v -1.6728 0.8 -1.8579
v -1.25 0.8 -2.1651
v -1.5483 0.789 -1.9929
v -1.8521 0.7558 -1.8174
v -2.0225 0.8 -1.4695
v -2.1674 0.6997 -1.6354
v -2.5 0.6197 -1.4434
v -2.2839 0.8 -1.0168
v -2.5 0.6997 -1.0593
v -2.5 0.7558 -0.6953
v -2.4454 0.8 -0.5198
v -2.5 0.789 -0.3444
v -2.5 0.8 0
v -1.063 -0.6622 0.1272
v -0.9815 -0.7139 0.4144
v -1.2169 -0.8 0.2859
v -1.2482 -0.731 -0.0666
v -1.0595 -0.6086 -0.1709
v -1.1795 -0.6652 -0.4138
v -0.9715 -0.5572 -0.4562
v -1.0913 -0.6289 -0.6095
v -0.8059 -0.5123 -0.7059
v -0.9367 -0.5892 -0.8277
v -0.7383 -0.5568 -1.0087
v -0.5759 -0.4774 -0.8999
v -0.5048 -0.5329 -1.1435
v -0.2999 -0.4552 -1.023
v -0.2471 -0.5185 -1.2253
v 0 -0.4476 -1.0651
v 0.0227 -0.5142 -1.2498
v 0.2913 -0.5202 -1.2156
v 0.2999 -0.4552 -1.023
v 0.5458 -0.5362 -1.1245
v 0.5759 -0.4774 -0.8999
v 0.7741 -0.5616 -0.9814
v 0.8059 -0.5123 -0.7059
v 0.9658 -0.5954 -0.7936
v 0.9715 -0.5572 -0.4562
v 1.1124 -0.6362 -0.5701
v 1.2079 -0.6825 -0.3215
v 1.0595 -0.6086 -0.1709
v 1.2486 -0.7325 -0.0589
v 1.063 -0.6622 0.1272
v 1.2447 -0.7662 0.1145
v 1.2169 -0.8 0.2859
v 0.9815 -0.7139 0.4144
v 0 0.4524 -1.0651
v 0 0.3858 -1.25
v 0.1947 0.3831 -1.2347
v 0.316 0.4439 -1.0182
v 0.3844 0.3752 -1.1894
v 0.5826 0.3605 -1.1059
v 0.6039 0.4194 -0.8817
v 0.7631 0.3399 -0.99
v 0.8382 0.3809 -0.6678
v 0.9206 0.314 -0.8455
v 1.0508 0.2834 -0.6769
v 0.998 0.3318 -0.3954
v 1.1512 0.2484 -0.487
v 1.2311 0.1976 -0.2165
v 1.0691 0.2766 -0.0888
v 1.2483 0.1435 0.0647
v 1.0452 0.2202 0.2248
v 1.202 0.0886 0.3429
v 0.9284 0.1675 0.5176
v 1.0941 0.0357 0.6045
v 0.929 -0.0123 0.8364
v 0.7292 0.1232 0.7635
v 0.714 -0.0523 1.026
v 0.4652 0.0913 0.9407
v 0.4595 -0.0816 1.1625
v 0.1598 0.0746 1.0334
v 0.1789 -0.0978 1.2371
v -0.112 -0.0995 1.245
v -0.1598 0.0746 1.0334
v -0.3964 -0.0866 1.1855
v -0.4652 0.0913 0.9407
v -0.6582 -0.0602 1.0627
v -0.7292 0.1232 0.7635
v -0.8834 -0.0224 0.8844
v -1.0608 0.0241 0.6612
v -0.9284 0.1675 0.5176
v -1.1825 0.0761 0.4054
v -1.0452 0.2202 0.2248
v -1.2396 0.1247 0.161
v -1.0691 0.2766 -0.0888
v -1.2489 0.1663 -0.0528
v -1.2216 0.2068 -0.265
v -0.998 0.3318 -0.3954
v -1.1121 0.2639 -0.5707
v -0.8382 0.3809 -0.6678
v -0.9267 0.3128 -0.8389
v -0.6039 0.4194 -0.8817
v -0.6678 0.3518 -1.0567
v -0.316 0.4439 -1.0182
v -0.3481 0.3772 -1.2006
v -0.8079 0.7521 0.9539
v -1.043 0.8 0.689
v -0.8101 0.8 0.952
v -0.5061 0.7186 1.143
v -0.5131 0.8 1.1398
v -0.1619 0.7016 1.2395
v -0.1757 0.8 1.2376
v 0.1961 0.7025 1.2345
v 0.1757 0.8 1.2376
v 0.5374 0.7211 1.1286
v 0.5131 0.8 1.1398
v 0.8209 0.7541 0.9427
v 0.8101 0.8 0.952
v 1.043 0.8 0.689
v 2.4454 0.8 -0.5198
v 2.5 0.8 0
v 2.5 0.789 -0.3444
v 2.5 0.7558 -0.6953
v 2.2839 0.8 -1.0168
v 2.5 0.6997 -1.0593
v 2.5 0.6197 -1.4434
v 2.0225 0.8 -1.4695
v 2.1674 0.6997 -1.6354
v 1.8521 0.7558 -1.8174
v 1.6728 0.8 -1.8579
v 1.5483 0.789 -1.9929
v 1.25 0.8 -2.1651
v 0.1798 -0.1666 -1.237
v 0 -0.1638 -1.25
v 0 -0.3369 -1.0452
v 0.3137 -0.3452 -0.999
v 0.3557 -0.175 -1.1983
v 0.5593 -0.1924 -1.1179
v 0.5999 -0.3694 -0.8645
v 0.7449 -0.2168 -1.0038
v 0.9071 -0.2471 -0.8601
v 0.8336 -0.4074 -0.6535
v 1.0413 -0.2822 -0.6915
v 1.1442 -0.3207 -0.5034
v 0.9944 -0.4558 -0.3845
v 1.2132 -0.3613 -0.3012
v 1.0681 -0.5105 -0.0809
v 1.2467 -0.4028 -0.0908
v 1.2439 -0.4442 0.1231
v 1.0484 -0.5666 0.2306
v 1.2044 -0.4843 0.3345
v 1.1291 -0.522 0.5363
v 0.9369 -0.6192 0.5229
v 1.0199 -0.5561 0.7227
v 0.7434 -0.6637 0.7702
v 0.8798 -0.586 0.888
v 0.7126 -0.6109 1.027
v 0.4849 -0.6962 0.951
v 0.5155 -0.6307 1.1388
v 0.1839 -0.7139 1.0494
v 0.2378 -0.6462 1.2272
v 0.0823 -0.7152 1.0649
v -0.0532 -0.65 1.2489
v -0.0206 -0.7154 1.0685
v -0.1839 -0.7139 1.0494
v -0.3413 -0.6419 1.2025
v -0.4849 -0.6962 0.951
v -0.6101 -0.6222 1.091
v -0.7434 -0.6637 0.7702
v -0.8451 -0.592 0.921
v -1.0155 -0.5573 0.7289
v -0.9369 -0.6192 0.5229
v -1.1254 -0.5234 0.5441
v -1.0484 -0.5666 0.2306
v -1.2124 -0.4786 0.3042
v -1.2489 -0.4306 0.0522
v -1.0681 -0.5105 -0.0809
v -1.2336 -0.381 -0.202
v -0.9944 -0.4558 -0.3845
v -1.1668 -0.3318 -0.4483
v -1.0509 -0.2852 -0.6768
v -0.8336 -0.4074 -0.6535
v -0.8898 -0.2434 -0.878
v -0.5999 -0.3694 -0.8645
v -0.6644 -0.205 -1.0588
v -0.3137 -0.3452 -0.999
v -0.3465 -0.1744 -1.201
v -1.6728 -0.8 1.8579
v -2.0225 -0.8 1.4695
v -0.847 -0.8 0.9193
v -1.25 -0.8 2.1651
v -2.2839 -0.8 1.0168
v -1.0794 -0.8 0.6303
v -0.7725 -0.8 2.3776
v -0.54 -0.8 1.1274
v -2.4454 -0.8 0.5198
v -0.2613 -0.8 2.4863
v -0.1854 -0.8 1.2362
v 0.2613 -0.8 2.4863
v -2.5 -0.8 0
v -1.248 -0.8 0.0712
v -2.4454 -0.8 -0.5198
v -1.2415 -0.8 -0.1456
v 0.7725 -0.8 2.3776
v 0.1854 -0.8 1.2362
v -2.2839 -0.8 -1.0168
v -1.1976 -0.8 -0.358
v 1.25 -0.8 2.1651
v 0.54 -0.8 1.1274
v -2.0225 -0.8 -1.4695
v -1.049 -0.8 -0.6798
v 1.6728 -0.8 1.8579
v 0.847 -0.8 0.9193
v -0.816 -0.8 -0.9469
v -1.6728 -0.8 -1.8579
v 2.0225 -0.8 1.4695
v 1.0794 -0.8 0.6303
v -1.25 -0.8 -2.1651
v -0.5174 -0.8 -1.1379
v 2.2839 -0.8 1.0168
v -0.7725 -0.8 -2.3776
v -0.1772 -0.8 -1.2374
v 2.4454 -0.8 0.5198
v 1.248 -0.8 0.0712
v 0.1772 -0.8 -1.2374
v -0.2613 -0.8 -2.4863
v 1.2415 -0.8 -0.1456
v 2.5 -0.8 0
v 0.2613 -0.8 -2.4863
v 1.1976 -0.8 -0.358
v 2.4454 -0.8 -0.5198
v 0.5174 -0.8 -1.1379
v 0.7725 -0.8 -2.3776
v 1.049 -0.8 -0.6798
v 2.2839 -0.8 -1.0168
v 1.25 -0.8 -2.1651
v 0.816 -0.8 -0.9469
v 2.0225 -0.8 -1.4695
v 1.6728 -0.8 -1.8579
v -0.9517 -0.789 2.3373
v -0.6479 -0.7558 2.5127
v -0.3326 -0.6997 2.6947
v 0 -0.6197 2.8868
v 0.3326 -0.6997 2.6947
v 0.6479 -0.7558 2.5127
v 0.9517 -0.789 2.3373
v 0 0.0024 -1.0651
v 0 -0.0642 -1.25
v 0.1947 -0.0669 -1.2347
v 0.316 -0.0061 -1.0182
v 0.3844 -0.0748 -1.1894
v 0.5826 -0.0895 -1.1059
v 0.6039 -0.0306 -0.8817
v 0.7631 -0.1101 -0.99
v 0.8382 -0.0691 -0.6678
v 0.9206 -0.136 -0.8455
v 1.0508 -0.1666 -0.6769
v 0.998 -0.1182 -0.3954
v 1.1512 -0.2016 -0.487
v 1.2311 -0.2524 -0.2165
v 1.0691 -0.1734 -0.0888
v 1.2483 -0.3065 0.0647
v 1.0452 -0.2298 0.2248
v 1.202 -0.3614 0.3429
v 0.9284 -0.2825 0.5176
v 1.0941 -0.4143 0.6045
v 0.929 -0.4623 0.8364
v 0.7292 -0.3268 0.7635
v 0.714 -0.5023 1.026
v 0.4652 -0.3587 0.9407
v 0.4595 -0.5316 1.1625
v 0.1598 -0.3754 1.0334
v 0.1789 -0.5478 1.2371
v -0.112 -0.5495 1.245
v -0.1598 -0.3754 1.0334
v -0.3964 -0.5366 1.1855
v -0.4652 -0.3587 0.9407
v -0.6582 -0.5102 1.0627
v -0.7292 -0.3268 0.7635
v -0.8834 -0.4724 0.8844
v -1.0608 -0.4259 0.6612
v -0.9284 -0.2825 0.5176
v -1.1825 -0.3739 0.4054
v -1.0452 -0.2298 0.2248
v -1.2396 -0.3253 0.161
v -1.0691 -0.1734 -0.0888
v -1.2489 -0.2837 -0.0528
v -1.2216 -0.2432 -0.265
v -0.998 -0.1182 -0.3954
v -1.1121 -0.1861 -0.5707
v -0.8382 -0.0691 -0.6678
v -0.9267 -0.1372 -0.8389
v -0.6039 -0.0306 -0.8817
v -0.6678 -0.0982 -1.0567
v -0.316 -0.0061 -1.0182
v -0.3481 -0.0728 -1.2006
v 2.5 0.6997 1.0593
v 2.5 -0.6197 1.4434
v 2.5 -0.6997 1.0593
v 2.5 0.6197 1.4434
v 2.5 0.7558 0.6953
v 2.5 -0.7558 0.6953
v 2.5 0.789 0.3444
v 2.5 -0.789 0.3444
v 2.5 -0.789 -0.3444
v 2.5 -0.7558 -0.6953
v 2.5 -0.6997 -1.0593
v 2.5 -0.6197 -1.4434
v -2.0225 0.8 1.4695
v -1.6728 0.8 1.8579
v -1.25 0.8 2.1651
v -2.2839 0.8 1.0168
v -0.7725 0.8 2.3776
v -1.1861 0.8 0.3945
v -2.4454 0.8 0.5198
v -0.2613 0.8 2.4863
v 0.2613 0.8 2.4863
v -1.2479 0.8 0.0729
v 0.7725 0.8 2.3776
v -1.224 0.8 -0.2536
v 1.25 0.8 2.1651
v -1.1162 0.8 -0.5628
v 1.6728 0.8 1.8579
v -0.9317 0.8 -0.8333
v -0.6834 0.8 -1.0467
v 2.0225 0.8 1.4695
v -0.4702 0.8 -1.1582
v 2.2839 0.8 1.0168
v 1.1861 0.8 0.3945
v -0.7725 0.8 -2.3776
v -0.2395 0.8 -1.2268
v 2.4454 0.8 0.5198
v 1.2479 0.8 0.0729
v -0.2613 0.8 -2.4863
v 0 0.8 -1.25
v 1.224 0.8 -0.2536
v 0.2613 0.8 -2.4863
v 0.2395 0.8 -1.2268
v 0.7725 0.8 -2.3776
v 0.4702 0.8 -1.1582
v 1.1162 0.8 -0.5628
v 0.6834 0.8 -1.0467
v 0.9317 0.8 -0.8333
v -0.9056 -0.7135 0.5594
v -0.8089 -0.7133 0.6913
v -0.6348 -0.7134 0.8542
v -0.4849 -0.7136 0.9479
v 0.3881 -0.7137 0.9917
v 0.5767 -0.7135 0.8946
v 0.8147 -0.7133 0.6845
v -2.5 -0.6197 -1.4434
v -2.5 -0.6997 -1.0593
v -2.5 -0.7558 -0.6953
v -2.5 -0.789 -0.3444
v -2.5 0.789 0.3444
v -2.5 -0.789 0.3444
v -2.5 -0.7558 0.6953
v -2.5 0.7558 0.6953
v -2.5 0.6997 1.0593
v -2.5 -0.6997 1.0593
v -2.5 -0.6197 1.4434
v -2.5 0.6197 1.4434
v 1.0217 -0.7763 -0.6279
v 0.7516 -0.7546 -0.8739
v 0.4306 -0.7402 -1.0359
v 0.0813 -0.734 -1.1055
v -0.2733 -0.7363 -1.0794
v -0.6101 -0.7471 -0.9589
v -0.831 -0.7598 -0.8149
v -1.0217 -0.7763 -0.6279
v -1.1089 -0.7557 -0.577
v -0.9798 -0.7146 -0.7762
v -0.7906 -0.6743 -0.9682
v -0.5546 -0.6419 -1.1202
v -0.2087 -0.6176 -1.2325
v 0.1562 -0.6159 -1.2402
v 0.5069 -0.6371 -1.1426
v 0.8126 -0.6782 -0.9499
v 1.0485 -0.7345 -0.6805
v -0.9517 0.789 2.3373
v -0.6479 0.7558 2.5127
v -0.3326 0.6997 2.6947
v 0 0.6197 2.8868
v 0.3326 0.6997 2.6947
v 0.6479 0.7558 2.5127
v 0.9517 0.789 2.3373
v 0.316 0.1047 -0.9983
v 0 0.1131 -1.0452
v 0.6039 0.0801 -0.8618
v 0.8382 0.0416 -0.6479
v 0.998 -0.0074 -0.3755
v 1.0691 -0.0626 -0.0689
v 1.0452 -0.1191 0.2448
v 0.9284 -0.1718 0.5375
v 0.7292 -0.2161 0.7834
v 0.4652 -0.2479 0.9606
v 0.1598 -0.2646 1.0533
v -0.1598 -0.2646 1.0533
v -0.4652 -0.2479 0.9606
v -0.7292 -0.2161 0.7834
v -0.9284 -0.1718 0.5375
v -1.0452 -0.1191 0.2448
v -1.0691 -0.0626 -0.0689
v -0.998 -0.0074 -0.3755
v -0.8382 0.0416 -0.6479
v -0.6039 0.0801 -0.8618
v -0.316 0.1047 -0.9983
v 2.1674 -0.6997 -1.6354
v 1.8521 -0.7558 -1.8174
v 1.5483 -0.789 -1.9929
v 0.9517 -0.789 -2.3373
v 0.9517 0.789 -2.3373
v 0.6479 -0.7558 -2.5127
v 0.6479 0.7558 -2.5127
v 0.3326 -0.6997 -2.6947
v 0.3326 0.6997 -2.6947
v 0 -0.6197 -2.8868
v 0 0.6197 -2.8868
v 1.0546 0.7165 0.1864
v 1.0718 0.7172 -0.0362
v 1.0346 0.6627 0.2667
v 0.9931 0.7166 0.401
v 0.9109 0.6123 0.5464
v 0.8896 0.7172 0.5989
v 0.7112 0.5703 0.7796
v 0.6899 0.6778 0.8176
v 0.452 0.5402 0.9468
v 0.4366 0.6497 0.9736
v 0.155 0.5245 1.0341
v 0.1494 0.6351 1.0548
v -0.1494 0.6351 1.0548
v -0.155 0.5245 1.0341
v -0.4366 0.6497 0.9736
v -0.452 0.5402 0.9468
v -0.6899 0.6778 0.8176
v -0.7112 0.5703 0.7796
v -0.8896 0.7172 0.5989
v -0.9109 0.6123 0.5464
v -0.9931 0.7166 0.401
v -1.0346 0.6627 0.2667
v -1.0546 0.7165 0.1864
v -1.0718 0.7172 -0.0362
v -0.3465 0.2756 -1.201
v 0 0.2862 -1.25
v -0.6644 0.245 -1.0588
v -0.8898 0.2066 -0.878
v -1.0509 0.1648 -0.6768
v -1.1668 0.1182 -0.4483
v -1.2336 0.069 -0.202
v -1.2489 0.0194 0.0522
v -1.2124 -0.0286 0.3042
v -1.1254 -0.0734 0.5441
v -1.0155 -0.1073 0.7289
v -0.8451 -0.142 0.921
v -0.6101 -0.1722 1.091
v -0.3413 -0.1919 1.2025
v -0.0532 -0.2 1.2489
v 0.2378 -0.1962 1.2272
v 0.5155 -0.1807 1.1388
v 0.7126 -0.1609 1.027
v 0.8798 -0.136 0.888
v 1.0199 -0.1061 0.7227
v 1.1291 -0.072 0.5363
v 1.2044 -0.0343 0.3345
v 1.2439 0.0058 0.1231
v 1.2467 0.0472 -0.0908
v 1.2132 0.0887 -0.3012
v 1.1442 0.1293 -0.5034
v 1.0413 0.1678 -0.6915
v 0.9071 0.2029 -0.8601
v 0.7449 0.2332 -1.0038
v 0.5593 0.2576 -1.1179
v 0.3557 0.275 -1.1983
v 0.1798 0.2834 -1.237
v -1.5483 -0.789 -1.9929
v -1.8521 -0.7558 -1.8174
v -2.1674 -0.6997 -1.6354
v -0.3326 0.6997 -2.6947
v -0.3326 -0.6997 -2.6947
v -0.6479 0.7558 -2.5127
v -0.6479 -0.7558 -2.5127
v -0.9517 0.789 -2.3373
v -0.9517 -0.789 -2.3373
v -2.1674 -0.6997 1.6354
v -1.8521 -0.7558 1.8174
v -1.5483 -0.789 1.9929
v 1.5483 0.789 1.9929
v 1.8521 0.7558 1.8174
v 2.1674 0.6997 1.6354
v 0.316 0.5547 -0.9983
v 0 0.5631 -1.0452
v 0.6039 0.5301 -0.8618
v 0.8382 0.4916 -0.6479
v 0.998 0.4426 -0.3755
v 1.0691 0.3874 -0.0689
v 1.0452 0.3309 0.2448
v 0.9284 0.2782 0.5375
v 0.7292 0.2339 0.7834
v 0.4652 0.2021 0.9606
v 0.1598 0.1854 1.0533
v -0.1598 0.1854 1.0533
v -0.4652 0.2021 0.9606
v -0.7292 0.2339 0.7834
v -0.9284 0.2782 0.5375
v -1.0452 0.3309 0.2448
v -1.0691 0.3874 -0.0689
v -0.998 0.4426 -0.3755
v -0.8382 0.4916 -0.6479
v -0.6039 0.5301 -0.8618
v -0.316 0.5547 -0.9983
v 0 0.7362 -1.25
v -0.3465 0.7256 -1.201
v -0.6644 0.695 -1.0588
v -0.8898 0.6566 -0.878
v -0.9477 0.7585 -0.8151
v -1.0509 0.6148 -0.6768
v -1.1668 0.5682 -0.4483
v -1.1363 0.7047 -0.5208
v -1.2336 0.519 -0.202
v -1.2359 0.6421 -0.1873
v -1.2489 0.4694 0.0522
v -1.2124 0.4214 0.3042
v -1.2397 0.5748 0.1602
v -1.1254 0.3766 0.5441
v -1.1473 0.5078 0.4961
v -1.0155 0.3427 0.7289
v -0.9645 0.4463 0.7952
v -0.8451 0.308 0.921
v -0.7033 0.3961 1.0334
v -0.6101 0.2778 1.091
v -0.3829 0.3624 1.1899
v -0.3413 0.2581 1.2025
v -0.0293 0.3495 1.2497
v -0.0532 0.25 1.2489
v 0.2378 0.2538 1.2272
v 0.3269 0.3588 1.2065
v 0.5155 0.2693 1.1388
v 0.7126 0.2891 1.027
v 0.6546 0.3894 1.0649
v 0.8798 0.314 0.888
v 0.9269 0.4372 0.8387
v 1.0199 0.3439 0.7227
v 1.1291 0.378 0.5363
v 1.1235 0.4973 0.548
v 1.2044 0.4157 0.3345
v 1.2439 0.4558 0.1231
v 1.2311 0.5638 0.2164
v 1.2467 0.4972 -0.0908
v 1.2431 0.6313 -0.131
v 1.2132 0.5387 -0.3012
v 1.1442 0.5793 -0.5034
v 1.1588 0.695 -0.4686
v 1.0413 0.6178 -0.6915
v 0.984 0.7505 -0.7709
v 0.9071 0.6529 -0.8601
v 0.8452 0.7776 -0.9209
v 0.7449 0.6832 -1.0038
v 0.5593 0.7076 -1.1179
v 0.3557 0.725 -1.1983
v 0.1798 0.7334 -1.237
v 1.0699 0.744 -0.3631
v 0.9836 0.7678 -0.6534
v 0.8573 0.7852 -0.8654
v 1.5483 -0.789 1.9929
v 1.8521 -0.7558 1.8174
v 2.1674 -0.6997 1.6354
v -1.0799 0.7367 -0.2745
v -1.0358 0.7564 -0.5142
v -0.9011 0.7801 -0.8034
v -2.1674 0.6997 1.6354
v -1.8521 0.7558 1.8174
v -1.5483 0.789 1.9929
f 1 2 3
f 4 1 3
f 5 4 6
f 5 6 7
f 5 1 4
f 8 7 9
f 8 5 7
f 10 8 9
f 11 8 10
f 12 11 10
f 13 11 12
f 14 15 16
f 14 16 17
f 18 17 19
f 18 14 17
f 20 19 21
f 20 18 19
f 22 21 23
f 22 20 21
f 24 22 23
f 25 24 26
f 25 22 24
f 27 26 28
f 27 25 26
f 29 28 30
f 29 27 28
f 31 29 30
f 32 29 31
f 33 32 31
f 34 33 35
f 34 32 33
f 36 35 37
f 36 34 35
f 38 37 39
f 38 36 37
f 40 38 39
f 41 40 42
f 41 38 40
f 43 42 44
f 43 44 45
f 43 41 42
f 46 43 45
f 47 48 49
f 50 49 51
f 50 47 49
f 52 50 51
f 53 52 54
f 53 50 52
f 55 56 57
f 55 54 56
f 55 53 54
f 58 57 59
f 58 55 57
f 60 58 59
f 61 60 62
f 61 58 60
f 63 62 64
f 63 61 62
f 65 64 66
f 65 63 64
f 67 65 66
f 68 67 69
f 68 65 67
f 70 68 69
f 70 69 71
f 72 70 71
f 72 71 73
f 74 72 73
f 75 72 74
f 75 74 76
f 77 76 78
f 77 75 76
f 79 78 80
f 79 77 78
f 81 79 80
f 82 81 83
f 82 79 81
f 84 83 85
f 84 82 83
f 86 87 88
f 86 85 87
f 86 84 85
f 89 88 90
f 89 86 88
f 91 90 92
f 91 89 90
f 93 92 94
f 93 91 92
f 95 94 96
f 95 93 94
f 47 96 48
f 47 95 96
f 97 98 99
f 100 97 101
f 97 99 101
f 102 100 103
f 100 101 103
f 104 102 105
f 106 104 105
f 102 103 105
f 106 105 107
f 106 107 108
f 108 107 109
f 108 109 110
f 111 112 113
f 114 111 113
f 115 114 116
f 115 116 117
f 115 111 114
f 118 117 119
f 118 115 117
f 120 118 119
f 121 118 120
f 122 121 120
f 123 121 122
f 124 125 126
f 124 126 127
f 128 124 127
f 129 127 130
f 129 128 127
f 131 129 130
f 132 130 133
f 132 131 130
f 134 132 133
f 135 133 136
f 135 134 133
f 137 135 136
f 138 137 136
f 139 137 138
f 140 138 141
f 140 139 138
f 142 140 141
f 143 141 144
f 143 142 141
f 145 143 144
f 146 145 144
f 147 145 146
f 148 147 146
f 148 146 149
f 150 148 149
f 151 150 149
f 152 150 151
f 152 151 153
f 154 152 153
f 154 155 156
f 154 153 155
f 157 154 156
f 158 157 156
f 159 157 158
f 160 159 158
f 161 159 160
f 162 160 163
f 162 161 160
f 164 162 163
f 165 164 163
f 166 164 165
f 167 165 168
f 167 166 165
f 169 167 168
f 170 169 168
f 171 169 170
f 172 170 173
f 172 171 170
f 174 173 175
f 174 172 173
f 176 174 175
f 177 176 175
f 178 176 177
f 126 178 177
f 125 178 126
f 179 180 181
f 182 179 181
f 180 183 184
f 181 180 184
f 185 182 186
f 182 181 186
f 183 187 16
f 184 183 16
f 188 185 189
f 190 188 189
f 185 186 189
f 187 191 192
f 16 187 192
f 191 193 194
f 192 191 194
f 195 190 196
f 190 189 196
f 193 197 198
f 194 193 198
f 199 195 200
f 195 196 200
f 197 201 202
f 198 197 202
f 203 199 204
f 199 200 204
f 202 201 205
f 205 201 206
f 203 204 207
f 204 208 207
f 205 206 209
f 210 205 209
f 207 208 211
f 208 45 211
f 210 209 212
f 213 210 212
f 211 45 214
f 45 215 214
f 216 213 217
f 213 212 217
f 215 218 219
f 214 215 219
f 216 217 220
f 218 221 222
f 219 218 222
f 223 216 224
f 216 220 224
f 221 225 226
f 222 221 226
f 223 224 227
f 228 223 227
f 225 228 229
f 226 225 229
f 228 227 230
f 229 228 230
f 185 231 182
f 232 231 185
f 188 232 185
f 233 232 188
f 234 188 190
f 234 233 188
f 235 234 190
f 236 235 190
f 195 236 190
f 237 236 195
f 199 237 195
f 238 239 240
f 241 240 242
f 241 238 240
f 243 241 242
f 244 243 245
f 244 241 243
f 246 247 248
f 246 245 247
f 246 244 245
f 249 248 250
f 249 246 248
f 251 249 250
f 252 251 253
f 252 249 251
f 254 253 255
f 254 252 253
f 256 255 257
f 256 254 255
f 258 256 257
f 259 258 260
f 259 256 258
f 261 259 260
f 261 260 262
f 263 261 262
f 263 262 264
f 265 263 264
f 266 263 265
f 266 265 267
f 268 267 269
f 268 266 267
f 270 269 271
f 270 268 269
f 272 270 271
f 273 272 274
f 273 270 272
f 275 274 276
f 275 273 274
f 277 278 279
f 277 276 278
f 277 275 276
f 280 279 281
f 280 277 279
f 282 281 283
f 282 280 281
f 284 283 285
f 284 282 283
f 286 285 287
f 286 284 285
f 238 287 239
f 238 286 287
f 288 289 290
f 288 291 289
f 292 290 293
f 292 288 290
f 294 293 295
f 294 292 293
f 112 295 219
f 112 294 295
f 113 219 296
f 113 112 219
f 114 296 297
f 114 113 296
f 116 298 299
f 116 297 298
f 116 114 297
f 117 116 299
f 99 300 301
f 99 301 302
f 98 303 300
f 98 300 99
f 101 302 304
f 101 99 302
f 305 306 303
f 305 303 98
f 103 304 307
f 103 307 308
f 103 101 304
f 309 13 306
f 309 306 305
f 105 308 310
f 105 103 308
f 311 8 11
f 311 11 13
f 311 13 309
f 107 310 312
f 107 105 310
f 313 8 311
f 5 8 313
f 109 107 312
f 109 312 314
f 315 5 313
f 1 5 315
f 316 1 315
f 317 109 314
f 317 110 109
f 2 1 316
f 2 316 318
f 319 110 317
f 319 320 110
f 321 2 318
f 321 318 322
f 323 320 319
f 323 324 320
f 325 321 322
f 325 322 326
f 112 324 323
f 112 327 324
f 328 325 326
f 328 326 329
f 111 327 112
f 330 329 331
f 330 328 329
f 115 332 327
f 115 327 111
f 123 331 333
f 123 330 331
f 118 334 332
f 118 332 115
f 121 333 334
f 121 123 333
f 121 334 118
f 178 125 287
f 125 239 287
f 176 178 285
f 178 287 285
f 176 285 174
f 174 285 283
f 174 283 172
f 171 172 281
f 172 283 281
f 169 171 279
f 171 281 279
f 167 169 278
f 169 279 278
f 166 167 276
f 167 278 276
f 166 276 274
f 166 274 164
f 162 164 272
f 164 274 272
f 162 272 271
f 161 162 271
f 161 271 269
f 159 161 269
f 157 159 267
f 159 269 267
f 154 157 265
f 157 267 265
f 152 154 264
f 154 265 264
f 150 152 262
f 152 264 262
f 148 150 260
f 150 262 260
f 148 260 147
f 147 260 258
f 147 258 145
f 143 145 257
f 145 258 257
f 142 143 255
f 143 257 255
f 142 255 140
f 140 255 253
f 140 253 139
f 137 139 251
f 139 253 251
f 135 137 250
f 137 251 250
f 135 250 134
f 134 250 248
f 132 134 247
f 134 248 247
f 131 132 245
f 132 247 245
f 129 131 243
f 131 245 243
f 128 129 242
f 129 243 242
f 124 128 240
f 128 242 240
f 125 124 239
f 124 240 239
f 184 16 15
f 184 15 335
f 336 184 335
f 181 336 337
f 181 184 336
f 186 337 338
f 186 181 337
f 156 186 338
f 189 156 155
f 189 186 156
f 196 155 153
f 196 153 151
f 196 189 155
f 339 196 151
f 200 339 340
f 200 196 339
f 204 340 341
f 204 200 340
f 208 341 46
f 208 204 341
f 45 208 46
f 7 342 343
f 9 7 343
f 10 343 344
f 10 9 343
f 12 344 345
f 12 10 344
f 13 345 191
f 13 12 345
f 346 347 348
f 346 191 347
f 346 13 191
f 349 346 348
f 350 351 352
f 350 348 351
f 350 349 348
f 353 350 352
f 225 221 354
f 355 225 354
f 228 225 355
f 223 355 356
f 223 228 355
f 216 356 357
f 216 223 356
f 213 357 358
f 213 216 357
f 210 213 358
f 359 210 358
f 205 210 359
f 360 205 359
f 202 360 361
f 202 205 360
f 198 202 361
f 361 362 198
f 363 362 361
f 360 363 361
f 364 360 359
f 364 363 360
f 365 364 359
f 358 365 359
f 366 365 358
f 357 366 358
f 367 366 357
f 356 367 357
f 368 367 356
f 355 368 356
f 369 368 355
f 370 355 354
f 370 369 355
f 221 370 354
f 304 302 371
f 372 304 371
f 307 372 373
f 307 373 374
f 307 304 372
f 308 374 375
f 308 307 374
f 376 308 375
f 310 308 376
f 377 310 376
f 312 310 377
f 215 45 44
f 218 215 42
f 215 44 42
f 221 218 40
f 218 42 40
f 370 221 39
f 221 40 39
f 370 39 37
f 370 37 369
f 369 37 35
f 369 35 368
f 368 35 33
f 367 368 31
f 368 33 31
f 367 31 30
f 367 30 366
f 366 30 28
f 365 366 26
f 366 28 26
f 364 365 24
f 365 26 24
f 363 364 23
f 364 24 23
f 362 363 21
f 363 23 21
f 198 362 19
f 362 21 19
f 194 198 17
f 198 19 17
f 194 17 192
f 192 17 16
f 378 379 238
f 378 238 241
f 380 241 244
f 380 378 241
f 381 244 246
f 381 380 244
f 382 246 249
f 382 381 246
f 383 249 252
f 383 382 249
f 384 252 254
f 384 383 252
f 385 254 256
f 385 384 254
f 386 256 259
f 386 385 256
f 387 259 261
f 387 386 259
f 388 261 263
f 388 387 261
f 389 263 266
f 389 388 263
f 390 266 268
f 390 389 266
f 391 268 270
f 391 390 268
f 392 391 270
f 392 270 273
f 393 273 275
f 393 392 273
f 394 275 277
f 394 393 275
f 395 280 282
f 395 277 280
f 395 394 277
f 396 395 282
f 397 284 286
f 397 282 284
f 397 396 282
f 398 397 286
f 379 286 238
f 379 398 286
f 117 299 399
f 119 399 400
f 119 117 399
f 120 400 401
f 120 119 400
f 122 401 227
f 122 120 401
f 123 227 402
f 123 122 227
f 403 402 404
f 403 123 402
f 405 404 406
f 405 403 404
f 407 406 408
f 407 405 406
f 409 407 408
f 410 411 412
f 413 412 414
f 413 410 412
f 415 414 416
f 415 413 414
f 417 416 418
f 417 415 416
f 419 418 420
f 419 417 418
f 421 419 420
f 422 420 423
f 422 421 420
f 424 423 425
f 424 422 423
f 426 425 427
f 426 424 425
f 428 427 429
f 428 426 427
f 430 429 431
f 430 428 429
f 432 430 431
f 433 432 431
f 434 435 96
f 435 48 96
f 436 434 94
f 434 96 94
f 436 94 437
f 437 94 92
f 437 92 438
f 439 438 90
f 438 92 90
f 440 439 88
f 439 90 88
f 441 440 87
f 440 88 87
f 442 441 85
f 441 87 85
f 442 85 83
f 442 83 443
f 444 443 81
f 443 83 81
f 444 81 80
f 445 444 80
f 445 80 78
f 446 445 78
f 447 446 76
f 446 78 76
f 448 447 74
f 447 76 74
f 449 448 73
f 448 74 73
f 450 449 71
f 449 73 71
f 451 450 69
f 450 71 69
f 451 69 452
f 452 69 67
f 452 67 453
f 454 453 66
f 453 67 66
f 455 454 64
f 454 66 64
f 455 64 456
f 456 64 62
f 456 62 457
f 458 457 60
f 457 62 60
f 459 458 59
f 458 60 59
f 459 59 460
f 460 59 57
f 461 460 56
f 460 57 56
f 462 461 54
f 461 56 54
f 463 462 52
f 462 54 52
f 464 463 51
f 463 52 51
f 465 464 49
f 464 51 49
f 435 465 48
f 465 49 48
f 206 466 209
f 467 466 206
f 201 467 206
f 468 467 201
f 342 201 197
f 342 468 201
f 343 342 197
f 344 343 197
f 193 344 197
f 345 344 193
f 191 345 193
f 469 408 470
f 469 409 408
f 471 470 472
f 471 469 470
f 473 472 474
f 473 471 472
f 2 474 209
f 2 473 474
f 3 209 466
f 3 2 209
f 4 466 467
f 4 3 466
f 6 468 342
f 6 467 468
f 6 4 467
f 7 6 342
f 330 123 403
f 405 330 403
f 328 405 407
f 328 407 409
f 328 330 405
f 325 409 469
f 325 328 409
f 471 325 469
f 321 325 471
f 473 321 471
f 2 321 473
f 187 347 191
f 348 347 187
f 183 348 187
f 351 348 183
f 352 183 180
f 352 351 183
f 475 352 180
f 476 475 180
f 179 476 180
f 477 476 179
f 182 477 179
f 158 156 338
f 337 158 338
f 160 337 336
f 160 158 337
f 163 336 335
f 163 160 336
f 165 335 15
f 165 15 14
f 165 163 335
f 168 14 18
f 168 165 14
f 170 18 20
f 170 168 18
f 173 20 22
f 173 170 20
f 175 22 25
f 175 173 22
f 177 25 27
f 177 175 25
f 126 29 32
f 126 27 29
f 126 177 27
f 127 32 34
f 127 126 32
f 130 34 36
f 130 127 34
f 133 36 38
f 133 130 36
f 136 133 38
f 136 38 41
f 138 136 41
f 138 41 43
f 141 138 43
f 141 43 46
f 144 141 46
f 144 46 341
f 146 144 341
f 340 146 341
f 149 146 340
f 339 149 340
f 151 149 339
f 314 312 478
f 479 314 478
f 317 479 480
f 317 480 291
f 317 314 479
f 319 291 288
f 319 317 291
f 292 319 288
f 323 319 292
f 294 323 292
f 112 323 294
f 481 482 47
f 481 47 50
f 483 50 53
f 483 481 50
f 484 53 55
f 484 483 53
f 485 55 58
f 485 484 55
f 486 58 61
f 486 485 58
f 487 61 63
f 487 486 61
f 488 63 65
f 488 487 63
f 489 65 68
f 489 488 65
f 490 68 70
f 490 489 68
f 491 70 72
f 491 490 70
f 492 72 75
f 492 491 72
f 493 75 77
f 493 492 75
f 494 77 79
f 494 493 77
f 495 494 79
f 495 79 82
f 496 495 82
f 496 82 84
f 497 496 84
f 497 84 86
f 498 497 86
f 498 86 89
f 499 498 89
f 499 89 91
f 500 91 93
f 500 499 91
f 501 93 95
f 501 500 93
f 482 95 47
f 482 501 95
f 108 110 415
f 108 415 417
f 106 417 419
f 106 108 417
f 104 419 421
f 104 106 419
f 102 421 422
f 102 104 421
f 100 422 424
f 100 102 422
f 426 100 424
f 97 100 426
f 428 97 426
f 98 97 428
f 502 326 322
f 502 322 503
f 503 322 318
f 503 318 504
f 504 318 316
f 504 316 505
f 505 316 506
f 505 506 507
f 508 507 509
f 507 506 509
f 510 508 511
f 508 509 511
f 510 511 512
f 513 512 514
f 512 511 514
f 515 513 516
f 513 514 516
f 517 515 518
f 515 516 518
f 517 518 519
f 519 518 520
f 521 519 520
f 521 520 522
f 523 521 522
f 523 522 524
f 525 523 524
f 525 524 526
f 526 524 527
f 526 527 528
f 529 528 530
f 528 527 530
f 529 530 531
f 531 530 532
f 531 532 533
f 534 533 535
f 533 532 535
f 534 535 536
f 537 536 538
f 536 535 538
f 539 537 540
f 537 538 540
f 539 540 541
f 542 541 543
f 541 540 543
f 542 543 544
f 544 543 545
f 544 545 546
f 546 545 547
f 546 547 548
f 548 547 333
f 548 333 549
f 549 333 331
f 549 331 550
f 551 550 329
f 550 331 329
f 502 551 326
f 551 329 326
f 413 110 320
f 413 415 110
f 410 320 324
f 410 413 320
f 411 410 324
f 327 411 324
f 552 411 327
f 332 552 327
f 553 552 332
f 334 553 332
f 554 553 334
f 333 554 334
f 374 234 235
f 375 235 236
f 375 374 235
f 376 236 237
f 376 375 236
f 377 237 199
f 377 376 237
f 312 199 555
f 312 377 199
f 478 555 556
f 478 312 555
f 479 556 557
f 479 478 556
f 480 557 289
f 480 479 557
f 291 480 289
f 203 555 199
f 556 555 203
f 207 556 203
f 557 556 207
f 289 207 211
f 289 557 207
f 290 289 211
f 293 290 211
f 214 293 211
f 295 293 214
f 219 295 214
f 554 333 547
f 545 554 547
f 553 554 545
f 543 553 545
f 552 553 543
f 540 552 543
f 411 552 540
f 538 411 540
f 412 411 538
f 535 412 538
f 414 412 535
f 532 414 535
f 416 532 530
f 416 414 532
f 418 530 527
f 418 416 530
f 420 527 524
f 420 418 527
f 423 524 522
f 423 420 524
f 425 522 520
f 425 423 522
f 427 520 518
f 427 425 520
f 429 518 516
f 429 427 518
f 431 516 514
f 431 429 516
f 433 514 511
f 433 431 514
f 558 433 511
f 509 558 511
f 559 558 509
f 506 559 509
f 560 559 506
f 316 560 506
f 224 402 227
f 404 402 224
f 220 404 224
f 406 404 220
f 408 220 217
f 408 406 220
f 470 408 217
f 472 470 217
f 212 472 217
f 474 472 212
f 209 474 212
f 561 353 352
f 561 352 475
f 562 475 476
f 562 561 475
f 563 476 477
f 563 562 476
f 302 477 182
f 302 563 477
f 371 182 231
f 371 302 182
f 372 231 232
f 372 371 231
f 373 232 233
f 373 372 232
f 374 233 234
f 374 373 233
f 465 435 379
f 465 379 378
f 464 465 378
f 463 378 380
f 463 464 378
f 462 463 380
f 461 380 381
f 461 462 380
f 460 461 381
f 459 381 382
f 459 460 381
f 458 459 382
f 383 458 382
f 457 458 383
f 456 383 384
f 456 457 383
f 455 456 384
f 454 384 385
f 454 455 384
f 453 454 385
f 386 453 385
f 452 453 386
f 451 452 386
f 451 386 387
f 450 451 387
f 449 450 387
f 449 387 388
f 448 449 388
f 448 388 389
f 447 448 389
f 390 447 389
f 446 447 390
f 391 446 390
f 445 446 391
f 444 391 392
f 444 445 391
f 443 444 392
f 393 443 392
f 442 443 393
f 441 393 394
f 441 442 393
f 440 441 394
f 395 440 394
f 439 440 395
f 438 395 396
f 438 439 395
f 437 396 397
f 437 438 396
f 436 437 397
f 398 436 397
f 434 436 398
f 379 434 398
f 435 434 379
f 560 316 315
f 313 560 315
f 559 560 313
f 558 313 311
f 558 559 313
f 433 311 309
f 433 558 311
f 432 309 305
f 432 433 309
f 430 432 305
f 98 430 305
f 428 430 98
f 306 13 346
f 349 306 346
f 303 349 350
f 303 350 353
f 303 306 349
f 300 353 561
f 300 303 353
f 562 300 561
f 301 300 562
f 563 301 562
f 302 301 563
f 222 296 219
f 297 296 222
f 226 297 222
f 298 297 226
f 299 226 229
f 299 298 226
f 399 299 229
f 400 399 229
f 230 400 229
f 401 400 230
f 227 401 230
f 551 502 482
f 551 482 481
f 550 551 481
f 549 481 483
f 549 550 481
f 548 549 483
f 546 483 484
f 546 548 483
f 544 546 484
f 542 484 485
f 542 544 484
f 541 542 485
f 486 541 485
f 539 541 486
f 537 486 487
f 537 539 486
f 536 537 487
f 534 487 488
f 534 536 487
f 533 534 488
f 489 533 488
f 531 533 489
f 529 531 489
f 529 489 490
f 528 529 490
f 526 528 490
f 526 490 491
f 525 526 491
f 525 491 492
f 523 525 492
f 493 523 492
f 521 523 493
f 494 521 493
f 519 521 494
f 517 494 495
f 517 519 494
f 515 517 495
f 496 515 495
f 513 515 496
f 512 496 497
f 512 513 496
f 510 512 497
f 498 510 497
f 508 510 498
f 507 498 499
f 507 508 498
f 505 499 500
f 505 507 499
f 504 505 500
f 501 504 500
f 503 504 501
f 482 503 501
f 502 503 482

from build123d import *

# Parameters (mm, degrees)
EXTRUDE1_DEPTH      = 0.8
SKETCH2_W           = 1.25
SKETCH2_H           = 1.6
LPATTERN1_COUNT     = 4
LPATTERN1_PITCH     = 0.45
LPATTERN1_COL_COUNT = 2
LPATTERN1_COL_PITCH = 0.45


with BuildPart() as part:
    # Sketch1 → Extrude1 (new body, symmetric)
    with BuildSketch(Plane(origin=(0, 0, 0), x_dir=(1, 0, 0), z_dir=(0, 1, 0))):
        Polygon((0, 2.886751346), (-2.5, 1.443375673), (-2.5, -1.443375673), (0, -2.886751346), (2.5, -1.443375673), (2.5, 1.443375673), align=None)
    extrude(amount=EXTRUDE1_DEPTH, both=True)

    # Sketch4 → Cut-Revolve2 (revolve, cut)
    with BuildSketch(Plane(origin=(0, 0, 0), x_dir=(0, 0, -1), z_dir=(1, 0, 0))):
        Polygon((0, 0.8), (1.25, 0.8), (1.045159814, 0.704481453), (1.045159814, -0.704481453), (1.25, -0.8), (0, -0.8), align=None)
    revolve(axis=Axis((0, 0.8, 0), (0, 1, 0)), mode=Mode.SUBTRACT)


with BuildPart() as body_2:
    # Sketch2 → Revolve1 (revolve)
    with BuildSketch(Plane(origin=(0, 0, 0), x_dir=(0, 0, -1), z_dir=(1, 0, 0))):
        with Locations((0.625, 0)):
            Rectangle(SKETCH2_W, SKETCH2_H)
    revolve(axis=Axis((0, -2.05, 0), (0, 1, 0)))

    # Sketch3 → Cut-Revolve1 (revolve, cut)
    with BuildSketch(Plane(origin=(0, 0, 0), x_dir=(0, 0, -1), z_dir=(1, 0, 0))):
        Polygon((1.259964856, 0.744639688), (1.329718849, 0.357117504), (1.065089526, 0.452369191), (1.045159814, 0.563089815), align=None)
    cut_revolve1 = revolve(axis=Axis((0, 0.8, 0.086794729), (0, -0.984183324, -0.177152998)), mode=Mode.SUBTRACT)

    # LPattern1: Cut-Revolve1 ×4
    with Locations(*[(0, -i * LPATTERN1_PITCH, 0) for i in range(1, LPATTERN1_COUNT)]):
        add(cut_revolve1, mode=Mode.SUBTRACT)

    # LPattern1 col: Cut-Revolve1 ×2
    with Locations(*[(0, i * LPATTERN1_COL_PITCH, 0) for i in range(1, LPATTERN1_COL_COUNT)]):
        add(cut_revolve1, mode=Mode.SUBTRACT)


with BuildPart() as part_1:
    add(part.part)

    # Combine1: cut body 2
    add(body_2.part, mode=Mode.SUBTRACT)

    # Sketch5 → Cut-Revolve3 (revolve, cut)
    with BuildSketch(Plane(origin=(0, 0, 0), x_dir=(0, 0, -1), z_dir=(1, 0, 0))):
        Polygon((0, -0.8), (2.5, -0.8), (2.886751346, -0.619654886), (2.886751346, 0.619654886), (2.5, 0.8), (0, 0.8), (0, 2.07), (4.156751346, 2.07), (4.156751346, -2.07), (0, -2.07), align=None)
    revolve(axis=Axis((0, -0.8, 0), (0, 1, 0)), mode=Mode.SUBTRACT)


solid = part_1.part
